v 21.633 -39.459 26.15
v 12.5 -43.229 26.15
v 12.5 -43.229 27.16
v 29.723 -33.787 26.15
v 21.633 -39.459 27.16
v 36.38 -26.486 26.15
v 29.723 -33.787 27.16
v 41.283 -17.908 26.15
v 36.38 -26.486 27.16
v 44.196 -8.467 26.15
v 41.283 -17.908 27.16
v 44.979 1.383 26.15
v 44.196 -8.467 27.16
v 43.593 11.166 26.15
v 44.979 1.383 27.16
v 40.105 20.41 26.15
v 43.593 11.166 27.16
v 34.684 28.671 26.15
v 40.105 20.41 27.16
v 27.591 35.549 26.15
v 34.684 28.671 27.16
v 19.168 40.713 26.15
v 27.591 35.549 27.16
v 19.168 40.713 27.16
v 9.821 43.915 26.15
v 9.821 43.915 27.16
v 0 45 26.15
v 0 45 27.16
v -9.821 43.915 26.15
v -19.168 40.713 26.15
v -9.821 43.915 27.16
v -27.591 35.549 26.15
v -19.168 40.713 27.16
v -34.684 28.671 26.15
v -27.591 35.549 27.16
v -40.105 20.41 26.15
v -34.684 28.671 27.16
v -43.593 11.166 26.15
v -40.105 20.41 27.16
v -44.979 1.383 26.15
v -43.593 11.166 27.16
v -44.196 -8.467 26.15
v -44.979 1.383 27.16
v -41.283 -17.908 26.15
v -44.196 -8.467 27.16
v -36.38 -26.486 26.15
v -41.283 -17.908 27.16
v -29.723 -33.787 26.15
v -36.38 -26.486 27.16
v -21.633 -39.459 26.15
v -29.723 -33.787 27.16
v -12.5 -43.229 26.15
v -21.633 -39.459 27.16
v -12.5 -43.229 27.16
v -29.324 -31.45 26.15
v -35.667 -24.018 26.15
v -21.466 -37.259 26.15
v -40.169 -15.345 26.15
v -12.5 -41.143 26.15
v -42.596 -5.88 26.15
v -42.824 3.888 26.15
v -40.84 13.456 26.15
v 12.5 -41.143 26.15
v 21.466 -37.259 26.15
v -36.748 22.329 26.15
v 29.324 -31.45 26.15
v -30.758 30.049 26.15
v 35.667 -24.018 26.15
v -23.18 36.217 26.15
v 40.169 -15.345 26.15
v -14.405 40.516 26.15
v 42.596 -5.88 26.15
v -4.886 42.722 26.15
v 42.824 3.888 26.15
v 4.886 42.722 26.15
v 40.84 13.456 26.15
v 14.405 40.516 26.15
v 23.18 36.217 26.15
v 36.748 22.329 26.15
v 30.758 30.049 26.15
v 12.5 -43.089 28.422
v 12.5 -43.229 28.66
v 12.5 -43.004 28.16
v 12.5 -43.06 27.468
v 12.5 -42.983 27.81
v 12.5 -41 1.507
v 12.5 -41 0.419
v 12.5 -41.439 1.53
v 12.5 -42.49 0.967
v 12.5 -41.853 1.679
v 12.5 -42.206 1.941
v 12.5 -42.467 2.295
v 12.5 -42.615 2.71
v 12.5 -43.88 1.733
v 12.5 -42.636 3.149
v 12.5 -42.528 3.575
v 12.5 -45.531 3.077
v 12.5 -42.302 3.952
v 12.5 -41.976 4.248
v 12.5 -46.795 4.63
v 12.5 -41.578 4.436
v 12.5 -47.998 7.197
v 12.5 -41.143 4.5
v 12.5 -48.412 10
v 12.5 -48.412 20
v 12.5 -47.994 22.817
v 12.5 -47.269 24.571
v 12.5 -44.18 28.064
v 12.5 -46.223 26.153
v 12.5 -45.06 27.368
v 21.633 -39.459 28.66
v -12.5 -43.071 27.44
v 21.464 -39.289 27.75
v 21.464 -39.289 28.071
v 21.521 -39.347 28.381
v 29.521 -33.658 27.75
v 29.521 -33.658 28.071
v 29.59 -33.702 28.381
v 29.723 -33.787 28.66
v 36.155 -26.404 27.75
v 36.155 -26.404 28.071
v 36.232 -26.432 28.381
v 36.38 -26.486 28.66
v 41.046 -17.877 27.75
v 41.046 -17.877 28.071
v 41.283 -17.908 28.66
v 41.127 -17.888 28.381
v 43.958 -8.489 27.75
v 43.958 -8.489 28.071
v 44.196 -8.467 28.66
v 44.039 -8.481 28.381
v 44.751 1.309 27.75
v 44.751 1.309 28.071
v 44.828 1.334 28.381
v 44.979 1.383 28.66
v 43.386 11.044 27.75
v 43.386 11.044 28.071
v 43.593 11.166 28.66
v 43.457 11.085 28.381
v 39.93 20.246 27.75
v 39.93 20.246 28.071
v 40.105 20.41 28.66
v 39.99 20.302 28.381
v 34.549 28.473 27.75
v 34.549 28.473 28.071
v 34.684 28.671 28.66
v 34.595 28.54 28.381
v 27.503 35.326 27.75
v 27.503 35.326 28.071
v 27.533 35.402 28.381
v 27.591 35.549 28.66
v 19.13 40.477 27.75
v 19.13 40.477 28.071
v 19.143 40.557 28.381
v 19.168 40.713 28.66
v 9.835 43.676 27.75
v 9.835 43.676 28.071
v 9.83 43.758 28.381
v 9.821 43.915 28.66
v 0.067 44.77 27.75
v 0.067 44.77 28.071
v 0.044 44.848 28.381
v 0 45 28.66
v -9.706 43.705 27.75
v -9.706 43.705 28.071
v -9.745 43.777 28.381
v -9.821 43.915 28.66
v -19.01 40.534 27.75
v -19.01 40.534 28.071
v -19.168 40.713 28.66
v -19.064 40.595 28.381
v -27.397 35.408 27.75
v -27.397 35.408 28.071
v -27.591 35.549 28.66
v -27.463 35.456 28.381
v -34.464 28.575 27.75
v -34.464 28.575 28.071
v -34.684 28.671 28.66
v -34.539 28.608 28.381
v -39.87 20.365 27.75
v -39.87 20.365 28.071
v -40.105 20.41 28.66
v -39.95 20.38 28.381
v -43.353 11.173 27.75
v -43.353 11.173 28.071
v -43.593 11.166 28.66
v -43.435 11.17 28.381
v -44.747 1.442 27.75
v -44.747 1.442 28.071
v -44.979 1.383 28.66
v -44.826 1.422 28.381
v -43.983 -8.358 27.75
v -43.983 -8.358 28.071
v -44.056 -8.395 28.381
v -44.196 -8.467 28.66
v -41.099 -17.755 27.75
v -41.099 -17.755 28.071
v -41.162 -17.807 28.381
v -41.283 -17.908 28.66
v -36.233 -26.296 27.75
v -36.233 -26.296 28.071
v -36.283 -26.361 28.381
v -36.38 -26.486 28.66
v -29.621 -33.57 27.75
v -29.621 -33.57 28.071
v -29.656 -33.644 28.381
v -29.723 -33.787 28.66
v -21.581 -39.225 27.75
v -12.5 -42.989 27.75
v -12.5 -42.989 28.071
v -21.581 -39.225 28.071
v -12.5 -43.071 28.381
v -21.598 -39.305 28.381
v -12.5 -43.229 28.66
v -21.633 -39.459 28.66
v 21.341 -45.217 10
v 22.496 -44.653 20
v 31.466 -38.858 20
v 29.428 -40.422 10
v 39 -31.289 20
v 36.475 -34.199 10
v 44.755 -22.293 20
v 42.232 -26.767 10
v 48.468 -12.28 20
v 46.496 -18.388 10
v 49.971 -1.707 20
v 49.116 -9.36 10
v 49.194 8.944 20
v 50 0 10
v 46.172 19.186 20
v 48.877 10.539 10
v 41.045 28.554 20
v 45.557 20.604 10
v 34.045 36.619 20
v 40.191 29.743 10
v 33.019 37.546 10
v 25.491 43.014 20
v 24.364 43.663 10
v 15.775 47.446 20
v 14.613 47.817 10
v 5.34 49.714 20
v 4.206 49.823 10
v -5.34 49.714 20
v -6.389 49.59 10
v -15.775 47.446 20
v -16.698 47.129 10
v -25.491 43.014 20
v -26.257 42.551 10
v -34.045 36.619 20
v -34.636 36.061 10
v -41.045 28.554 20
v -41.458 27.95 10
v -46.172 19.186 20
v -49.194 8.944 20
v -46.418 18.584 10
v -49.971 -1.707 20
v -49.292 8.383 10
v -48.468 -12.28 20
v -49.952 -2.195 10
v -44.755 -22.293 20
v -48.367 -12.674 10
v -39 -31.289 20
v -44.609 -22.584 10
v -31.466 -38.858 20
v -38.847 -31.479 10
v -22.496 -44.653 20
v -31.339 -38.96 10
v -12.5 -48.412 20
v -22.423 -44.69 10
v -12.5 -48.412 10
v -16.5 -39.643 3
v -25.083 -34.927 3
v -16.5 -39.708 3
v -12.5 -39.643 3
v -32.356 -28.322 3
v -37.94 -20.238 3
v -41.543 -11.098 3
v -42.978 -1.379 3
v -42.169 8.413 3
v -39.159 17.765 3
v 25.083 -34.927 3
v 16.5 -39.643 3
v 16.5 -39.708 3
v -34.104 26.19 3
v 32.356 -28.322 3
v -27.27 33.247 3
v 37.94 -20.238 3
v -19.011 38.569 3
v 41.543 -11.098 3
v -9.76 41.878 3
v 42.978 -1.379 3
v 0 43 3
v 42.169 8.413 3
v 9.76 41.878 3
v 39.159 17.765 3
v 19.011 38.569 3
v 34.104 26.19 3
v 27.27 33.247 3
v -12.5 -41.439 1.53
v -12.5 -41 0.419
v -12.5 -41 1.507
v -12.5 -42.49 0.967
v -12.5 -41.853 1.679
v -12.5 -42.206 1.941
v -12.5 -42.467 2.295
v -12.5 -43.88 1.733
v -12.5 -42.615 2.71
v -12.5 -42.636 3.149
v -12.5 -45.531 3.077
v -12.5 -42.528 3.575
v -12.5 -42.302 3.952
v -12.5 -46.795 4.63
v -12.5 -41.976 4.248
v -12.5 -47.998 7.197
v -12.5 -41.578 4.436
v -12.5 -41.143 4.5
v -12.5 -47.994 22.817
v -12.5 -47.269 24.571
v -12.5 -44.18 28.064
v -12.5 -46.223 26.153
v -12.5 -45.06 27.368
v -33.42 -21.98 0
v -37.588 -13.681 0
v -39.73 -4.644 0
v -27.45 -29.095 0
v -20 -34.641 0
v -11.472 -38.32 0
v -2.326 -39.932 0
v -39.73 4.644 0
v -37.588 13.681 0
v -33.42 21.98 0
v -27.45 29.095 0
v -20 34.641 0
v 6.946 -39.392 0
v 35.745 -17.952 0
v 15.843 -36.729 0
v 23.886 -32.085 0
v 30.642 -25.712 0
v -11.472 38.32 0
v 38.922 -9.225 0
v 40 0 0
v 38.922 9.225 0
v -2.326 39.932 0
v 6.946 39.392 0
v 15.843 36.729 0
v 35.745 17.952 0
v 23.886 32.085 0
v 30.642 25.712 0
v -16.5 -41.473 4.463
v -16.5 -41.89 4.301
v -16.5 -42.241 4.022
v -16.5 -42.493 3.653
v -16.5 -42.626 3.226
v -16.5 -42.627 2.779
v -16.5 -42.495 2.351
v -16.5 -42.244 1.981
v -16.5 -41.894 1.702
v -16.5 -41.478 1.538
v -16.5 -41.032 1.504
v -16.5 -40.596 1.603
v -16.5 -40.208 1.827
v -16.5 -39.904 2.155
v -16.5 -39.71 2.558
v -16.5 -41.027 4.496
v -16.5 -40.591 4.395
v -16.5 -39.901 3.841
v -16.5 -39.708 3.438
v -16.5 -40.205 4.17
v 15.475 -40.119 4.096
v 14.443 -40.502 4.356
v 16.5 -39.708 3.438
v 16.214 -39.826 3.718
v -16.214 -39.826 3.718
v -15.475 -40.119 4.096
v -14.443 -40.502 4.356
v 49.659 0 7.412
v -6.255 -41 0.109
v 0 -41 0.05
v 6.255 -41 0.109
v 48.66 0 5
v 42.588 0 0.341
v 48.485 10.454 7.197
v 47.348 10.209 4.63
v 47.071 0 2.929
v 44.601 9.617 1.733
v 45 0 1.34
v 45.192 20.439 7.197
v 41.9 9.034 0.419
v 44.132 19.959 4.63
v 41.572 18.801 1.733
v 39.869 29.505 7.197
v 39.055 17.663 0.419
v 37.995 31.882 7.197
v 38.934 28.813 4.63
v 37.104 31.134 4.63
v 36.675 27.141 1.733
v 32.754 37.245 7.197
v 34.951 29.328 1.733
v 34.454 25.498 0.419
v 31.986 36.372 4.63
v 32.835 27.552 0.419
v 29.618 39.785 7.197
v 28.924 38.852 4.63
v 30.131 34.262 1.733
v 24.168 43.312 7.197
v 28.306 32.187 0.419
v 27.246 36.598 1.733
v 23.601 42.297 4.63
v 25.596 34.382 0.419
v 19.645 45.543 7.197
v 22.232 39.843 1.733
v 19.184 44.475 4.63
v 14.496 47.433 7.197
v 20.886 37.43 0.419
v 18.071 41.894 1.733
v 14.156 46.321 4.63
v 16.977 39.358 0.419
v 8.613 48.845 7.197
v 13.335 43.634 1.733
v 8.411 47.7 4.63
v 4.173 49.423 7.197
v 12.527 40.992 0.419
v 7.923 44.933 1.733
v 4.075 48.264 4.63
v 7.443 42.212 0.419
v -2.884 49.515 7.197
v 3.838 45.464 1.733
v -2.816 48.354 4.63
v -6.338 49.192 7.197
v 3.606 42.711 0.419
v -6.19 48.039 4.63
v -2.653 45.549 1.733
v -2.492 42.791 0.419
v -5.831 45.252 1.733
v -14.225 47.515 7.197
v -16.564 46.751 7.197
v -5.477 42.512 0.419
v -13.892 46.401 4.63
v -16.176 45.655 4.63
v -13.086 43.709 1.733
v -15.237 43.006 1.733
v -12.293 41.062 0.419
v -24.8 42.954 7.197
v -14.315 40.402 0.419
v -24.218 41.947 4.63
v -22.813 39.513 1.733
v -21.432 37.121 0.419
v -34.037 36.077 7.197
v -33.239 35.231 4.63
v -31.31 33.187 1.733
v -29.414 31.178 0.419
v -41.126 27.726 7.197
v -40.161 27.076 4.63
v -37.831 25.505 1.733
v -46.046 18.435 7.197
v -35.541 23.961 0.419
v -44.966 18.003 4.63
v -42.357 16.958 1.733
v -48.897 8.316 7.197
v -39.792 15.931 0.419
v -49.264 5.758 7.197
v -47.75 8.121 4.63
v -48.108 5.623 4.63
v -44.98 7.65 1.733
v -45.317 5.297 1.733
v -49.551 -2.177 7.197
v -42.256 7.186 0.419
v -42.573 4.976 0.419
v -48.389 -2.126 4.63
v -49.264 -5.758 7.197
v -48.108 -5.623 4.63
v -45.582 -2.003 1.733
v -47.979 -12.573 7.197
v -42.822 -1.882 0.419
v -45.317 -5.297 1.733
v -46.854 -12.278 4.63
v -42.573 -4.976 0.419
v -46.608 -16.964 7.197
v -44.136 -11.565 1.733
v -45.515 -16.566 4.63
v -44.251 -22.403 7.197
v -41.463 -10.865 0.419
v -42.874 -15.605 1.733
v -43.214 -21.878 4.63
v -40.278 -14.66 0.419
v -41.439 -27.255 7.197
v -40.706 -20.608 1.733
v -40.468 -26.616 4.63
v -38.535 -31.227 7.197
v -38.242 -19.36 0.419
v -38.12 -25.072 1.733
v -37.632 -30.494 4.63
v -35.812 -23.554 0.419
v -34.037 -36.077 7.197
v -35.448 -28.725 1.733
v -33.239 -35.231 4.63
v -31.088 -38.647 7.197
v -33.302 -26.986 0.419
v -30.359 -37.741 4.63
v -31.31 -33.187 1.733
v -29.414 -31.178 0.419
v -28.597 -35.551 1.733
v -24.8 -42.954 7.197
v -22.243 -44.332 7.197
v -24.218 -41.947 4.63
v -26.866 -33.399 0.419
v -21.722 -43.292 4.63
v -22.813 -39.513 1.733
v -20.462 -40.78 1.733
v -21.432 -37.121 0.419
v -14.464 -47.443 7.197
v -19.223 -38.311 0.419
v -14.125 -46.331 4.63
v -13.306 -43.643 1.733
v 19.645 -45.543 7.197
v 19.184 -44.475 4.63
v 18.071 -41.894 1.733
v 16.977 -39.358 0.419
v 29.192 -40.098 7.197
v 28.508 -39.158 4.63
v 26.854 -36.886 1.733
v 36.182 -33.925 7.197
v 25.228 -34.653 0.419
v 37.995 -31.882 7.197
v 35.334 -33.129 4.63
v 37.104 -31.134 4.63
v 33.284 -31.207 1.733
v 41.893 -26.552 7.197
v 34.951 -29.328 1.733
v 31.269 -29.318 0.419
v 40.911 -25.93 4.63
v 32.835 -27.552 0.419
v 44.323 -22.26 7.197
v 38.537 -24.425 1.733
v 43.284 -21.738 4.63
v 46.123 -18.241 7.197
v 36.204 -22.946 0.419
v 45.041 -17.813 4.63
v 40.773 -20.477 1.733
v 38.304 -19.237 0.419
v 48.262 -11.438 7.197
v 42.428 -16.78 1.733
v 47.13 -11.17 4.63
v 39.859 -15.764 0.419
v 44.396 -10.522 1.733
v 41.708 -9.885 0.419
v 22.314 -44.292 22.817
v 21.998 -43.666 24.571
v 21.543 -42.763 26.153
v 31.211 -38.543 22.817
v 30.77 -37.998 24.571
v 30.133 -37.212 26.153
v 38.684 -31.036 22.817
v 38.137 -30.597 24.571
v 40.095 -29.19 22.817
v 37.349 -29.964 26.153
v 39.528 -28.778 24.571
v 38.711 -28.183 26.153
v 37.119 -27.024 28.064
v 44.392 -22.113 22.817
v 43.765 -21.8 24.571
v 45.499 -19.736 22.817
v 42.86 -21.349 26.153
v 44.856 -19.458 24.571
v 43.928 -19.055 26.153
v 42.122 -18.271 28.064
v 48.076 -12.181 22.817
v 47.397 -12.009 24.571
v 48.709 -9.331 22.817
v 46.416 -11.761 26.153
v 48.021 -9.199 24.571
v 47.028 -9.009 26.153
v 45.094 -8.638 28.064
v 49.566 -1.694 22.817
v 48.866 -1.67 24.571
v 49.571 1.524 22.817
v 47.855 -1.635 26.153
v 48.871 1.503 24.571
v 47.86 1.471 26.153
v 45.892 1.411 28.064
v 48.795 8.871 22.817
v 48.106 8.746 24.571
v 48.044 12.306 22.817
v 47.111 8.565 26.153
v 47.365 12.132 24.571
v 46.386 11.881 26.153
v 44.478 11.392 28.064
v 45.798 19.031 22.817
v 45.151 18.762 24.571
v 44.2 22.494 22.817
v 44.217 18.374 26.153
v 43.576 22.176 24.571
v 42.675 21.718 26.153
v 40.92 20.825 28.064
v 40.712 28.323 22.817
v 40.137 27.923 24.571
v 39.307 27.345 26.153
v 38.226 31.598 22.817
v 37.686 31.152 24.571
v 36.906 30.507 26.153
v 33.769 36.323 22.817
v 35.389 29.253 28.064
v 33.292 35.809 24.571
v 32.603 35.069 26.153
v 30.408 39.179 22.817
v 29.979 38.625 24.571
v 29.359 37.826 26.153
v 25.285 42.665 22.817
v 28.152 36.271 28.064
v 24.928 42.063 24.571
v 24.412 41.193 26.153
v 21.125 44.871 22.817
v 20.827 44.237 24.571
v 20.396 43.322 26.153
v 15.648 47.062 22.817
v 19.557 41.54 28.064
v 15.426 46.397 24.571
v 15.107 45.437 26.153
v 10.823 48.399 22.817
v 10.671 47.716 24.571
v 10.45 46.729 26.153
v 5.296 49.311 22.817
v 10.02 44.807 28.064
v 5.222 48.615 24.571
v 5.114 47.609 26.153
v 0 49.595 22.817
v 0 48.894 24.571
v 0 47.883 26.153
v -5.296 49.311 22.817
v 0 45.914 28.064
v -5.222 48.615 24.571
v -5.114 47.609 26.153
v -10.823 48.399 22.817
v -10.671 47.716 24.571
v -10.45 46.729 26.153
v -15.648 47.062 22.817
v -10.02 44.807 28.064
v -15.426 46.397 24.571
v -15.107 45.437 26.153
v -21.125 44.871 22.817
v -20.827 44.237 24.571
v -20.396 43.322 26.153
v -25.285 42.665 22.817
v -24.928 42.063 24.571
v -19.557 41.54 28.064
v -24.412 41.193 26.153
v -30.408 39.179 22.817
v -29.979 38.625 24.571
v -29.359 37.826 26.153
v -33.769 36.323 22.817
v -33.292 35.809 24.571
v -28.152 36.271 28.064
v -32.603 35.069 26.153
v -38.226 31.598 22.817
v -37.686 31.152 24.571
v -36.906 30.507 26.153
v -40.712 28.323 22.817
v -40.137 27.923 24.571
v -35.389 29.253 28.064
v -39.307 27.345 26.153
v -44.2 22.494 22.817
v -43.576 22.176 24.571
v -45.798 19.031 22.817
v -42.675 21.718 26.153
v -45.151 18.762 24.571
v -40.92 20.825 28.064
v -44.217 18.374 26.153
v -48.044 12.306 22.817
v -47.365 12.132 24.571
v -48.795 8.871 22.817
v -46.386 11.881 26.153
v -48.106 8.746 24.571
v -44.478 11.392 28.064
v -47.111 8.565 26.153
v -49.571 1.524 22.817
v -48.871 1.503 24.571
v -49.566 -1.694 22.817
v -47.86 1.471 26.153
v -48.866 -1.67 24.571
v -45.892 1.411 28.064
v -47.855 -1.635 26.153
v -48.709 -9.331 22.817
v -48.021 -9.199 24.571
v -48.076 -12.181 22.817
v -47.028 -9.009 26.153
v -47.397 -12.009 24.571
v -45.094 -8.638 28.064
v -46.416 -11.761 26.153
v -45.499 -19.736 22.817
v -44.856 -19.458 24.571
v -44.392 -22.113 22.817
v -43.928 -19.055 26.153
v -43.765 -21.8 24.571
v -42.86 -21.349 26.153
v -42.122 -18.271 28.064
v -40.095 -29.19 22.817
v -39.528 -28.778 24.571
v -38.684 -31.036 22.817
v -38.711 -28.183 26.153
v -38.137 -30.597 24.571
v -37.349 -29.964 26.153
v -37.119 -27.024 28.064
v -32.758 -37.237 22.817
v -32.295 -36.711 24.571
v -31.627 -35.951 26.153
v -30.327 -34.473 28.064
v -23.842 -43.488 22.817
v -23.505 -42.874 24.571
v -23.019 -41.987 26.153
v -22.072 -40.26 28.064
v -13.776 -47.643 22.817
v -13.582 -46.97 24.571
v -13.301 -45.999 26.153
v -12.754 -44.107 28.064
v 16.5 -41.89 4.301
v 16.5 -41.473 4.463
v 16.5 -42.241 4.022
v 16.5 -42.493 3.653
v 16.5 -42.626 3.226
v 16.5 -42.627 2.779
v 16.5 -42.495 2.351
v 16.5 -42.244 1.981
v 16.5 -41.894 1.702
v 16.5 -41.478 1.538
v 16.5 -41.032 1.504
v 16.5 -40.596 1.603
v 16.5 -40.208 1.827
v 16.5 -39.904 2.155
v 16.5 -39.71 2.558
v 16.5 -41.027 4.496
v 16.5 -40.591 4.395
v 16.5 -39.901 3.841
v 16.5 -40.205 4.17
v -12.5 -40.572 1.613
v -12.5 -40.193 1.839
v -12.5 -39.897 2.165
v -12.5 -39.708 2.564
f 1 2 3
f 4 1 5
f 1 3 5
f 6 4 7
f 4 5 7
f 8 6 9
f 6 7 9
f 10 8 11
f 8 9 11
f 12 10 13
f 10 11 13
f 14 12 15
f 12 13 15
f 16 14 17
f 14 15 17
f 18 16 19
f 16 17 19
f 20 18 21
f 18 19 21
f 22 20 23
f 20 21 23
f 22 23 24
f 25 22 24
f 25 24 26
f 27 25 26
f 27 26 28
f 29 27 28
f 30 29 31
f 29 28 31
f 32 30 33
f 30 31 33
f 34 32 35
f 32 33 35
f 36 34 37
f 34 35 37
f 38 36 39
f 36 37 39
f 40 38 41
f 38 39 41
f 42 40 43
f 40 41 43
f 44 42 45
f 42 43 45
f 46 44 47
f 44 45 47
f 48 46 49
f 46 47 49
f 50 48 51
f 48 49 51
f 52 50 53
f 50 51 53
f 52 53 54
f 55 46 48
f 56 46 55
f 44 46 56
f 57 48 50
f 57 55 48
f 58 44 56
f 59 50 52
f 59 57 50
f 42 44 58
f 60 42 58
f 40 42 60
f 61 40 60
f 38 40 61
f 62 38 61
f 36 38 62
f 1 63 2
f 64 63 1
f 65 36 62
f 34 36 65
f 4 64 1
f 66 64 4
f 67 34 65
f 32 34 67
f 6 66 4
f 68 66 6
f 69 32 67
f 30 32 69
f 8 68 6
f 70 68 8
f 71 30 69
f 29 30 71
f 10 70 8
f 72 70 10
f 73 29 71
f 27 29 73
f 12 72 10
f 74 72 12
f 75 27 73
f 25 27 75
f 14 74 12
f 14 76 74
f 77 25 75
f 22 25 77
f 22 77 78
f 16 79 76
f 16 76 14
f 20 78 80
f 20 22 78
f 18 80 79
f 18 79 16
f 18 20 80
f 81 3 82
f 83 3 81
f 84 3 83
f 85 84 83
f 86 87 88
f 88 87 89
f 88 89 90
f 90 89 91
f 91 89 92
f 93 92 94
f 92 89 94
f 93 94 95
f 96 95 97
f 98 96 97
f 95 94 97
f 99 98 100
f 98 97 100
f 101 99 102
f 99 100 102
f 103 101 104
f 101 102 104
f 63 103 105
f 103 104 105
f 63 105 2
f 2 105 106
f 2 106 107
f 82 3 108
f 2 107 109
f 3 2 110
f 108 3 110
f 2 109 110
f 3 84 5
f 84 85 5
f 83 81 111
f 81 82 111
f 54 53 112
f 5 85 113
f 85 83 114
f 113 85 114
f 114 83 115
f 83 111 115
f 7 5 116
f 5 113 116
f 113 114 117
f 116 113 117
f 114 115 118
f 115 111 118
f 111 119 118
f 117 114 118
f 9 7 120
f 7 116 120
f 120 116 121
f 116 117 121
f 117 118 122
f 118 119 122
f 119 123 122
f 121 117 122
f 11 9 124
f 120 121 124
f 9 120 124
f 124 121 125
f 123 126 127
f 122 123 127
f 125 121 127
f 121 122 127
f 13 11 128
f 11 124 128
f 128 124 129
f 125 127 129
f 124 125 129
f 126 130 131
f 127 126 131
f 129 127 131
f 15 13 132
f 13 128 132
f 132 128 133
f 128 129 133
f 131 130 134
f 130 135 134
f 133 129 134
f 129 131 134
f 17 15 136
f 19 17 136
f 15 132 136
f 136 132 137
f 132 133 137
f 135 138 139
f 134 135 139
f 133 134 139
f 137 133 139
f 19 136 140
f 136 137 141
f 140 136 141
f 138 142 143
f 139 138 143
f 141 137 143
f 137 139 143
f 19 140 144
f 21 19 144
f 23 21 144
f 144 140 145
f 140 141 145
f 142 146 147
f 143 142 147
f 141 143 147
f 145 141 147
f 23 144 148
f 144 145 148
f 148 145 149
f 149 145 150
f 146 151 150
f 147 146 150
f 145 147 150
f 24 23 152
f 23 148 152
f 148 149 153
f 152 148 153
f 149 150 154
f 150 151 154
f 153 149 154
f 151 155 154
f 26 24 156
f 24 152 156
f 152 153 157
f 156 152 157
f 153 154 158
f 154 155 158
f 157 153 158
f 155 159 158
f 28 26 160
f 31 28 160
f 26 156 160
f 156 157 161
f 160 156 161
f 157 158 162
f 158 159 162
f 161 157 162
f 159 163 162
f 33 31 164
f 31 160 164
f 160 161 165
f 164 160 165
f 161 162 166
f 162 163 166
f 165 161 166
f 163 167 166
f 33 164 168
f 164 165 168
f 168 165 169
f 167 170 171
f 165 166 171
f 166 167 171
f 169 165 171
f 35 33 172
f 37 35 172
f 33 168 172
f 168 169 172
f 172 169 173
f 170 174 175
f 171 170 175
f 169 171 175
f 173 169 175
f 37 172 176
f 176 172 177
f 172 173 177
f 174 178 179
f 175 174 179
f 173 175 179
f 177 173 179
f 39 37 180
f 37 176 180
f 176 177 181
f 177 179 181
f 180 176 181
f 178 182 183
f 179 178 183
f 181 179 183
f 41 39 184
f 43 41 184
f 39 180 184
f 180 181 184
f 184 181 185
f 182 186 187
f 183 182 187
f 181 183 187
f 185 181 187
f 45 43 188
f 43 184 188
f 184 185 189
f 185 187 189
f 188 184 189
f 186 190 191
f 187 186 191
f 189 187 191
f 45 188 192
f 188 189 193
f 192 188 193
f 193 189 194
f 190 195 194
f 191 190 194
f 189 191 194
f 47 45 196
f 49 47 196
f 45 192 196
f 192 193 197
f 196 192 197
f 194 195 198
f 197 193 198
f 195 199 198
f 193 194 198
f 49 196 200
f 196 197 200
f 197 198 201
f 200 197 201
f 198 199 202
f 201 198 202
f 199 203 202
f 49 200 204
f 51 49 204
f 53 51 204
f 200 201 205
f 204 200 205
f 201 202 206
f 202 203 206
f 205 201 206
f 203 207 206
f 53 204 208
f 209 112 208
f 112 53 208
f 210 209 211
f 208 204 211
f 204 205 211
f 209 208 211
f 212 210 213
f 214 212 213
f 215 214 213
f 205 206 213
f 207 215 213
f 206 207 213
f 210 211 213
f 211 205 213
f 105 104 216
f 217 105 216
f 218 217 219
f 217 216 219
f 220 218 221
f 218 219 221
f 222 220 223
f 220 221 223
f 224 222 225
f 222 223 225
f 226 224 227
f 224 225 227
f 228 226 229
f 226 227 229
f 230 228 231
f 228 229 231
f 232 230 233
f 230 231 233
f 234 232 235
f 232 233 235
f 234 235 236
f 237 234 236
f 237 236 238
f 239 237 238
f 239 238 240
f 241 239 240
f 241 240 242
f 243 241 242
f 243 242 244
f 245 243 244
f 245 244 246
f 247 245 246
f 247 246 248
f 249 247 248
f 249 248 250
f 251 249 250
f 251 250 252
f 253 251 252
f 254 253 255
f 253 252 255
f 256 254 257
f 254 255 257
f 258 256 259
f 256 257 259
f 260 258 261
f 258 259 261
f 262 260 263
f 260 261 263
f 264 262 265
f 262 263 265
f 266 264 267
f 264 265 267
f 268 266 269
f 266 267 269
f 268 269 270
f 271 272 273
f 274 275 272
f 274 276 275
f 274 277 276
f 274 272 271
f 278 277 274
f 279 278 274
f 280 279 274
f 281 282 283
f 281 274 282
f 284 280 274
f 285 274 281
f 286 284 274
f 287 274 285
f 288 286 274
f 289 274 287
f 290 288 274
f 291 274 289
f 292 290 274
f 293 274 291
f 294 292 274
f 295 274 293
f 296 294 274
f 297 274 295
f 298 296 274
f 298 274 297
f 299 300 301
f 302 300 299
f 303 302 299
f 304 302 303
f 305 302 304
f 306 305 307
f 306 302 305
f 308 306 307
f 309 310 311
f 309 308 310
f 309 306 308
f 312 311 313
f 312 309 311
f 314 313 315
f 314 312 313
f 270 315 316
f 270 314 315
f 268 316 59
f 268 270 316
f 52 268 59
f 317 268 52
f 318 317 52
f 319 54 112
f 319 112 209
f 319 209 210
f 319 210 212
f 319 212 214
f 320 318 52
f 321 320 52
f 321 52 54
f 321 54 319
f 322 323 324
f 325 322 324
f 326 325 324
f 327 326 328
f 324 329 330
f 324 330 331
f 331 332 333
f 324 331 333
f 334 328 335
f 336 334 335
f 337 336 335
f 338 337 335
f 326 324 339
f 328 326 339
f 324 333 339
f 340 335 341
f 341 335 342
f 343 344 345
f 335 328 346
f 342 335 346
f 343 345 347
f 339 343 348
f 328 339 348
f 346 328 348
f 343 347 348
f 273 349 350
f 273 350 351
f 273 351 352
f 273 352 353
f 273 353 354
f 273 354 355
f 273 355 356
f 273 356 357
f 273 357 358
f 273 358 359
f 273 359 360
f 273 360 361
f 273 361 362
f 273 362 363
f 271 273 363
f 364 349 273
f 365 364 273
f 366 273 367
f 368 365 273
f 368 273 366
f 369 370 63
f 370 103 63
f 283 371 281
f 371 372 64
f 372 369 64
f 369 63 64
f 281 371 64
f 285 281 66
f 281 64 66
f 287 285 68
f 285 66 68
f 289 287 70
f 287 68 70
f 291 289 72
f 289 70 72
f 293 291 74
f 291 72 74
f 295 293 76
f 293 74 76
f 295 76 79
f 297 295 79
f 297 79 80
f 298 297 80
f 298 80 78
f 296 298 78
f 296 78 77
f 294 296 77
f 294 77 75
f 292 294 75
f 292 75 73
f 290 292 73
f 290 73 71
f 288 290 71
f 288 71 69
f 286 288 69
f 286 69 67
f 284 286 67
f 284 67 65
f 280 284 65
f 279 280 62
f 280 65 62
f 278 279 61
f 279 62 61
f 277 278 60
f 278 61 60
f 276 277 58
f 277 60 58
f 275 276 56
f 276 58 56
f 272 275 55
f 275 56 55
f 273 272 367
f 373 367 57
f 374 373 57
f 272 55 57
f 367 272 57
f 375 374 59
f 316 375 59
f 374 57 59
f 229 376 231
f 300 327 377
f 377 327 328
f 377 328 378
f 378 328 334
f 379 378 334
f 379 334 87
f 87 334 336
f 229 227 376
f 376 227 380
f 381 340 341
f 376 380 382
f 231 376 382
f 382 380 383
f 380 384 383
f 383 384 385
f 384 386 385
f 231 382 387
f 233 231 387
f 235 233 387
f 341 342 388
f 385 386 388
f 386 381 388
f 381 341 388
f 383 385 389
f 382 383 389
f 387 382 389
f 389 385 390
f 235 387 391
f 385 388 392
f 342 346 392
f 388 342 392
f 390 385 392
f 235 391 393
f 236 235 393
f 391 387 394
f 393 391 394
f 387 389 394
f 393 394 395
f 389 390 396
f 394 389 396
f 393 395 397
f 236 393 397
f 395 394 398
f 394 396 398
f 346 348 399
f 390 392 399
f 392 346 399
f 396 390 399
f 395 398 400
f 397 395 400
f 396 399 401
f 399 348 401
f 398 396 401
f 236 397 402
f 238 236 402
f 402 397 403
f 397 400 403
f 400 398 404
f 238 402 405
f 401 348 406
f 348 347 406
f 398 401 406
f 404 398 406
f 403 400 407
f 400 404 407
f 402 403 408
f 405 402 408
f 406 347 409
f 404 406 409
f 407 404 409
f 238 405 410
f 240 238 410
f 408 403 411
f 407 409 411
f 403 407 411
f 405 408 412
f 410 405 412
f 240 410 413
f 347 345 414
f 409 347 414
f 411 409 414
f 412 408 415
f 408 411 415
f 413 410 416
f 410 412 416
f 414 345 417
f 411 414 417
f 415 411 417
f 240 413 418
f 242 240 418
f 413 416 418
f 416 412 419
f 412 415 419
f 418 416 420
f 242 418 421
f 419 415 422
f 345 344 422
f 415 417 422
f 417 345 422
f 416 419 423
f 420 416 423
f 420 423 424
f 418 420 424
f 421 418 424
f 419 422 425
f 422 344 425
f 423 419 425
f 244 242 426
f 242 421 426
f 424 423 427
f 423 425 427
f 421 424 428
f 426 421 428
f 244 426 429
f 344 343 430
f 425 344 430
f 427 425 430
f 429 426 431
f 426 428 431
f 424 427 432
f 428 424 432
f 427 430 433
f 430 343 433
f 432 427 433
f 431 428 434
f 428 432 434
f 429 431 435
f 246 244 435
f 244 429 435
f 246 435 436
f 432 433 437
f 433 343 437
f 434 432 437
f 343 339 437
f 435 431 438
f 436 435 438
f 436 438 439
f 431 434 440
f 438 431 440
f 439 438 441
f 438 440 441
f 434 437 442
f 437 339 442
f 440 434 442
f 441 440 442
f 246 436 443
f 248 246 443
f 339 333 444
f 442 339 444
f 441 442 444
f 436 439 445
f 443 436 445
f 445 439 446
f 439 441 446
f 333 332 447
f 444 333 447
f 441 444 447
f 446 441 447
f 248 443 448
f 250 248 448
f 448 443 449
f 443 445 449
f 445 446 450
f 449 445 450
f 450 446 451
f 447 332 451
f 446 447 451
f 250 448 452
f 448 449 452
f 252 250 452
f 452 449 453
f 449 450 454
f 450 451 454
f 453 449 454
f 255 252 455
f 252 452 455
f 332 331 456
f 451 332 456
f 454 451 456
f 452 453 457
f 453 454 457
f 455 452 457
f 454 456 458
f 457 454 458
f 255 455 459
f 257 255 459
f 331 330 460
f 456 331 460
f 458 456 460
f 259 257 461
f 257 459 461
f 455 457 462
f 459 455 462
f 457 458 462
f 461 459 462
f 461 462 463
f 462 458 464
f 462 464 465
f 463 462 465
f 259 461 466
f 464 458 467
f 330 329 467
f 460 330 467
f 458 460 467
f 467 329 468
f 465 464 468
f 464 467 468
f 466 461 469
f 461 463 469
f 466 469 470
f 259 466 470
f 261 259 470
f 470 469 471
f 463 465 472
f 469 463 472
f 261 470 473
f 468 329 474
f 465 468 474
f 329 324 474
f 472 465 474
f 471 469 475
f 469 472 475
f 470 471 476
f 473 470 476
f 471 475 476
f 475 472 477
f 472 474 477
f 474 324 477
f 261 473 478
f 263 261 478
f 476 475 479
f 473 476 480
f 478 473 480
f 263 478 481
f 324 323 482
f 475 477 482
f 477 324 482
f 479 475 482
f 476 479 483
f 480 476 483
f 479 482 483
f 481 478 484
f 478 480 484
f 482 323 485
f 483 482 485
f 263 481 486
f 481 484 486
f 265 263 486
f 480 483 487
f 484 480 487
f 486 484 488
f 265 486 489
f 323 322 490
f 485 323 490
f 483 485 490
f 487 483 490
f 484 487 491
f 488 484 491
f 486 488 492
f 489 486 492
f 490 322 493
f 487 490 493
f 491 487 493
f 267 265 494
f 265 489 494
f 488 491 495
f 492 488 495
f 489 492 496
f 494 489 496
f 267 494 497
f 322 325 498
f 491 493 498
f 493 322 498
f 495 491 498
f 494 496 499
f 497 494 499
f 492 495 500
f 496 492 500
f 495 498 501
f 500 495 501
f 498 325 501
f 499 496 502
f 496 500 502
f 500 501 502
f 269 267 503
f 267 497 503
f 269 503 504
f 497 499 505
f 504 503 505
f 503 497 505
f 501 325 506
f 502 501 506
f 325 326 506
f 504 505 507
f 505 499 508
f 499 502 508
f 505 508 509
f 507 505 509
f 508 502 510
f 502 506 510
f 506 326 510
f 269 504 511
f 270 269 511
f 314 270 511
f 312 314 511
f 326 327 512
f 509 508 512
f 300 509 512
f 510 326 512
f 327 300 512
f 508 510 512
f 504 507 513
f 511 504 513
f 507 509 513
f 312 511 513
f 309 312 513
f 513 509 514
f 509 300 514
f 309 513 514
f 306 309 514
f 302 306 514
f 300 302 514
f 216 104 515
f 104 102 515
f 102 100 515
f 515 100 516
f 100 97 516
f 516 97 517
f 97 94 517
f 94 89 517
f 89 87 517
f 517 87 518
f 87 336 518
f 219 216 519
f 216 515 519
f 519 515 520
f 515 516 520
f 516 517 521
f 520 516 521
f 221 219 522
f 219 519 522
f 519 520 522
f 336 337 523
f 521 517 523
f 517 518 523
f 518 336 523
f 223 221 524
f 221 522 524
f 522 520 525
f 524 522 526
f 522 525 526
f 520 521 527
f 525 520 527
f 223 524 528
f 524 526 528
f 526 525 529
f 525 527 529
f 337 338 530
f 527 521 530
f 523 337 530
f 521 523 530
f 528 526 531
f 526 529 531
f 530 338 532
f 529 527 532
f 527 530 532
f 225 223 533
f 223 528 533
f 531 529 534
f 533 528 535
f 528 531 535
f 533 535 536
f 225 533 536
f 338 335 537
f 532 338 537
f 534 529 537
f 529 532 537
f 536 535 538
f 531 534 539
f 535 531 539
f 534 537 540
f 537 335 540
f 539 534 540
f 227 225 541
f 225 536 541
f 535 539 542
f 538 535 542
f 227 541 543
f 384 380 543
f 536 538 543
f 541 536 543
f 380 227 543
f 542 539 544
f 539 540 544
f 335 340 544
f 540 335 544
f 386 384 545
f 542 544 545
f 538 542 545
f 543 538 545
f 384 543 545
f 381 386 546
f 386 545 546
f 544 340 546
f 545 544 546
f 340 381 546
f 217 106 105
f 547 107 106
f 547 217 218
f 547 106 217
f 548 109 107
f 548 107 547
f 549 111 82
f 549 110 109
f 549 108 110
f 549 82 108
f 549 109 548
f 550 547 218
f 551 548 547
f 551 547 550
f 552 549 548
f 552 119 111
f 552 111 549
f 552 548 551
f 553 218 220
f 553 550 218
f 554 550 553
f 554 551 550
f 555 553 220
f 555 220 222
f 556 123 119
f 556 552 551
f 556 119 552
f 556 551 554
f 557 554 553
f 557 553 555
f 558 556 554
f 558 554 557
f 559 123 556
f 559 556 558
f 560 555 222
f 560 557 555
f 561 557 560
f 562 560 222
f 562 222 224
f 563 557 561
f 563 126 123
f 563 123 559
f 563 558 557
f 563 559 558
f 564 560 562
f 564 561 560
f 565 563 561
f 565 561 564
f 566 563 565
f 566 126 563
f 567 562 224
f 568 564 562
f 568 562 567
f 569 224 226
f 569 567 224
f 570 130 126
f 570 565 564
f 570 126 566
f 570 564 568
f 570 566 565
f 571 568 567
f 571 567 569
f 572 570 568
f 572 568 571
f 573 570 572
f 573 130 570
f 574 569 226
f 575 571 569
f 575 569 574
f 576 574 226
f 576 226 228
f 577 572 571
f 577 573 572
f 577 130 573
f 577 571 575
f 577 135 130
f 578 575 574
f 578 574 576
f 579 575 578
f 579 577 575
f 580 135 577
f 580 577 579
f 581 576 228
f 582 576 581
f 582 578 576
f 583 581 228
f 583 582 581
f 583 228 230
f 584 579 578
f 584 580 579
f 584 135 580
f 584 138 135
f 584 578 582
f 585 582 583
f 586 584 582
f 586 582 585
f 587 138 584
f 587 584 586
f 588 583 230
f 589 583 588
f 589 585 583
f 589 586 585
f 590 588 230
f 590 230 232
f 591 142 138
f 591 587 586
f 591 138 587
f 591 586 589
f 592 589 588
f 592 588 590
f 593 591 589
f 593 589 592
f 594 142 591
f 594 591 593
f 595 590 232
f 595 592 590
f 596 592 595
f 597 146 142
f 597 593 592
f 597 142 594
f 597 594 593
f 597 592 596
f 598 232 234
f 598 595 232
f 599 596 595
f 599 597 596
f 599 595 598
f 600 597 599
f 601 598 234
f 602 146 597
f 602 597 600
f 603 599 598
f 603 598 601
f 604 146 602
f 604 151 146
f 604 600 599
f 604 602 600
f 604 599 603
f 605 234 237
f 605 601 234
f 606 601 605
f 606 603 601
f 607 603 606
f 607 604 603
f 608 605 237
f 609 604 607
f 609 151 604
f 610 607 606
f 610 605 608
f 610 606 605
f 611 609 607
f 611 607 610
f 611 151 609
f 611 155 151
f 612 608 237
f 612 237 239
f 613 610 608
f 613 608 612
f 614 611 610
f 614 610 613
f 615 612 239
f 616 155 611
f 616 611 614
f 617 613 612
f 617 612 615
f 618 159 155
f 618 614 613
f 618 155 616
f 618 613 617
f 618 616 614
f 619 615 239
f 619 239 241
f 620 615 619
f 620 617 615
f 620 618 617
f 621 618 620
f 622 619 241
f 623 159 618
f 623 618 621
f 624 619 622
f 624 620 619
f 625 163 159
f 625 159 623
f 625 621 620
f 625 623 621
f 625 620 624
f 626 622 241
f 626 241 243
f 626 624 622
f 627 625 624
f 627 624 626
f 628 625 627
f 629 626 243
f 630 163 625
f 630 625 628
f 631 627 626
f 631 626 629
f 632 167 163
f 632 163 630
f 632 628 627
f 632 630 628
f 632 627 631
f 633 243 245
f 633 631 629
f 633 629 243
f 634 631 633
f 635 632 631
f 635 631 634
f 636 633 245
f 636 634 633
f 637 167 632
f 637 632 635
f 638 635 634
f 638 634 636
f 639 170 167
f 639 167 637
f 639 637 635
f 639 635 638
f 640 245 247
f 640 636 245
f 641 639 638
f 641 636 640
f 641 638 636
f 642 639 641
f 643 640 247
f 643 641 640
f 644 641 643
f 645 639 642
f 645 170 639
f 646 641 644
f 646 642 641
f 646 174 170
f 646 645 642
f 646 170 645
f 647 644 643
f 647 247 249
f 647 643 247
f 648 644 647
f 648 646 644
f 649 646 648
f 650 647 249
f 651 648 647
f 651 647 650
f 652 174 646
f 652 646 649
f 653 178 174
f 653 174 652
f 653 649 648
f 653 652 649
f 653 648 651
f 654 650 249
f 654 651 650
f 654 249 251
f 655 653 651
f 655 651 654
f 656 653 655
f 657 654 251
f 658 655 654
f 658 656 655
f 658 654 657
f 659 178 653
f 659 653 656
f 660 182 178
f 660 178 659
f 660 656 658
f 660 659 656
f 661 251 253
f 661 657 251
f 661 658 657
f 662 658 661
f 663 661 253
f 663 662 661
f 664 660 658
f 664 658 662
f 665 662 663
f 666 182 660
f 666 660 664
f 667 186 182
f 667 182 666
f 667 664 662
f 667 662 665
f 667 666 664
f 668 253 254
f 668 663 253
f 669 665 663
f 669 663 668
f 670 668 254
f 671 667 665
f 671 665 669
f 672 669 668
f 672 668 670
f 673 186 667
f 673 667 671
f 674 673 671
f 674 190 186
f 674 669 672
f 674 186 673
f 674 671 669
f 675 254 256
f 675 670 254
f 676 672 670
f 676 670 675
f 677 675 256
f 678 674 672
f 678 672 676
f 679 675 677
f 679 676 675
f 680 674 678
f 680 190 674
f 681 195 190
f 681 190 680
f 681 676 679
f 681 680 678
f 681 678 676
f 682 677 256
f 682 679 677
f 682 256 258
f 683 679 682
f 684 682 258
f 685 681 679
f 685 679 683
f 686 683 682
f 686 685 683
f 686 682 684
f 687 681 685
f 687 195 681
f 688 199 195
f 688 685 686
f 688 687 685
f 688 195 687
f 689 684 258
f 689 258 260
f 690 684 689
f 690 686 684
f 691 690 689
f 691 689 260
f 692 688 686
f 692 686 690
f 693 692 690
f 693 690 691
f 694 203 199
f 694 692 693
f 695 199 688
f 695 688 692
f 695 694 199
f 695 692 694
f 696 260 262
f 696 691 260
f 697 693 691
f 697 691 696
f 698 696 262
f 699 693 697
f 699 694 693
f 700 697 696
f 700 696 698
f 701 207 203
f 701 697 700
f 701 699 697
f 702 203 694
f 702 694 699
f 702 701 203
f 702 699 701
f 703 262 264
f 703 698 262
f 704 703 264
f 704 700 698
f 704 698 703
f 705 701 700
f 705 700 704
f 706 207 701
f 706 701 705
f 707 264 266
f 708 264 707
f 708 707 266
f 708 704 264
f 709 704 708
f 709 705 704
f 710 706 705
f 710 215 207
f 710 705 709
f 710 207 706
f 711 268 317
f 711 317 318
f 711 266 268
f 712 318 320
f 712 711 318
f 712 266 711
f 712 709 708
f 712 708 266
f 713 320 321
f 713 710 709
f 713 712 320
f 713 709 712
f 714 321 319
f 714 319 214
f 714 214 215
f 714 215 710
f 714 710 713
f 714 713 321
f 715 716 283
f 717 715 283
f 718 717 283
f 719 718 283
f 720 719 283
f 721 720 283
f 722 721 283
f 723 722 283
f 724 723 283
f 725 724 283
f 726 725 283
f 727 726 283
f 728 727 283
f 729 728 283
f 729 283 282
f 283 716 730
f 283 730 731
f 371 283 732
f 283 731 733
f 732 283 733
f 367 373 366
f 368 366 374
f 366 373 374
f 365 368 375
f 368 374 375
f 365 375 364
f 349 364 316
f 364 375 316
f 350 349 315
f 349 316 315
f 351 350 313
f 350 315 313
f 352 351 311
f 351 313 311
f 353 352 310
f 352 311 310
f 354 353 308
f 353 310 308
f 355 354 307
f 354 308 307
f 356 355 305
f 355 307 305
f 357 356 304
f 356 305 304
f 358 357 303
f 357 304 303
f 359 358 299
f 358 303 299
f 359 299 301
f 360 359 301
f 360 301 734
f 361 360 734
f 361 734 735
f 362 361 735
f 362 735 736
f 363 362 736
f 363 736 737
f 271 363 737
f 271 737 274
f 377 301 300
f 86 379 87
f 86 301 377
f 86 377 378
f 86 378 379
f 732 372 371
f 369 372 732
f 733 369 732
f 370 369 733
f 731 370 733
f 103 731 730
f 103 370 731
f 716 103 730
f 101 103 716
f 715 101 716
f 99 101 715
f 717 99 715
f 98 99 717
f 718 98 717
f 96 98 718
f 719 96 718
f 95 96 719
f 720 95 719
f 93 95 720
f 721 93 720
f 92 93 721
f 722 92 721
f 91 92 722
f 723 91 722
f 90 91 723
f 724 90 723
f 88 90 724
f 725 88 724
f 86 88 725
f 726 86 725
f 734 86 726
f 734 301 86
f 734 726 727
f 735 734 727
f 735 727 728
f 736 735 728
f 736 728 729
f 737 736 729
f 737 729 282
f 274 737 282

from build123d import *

# Parameters (mm, degrees)
F0_R      = 50
F1_DEPTH  = 30
F2_R      = 10
F3_R      = 43
F4_DEPTH  = 27
F6_W      = 12.5
F6_H      = 30
F7_DEPTH  = 9
F9_R      = 45
F10_DEPTH = 3.85
F12_R     = 1.5
F13_DEPTH = 4
F14_DEPTH = 29
F18_DEPTH = 9


with BuildPart() as f1:
    # F0 (on Top) → F1 (new body)
    with BuildSketch(Plane.XY):
        Circle(F0_R)
    extrude(amount=F1_DEPTH)

    # F2
    f2_edges = [f1.edges().sort_by_distance(p)[0] for p in [
        (-50, 0, 30),
        (-50, 0, 0),
    ]]
    fillet(f2_edges, radius=F2_R)

    # F3 (on face) → F4 (cut)
    with BuildSketch(Plane.XY.offset(30)):
        Circle(F3_R)
    extrude(amount=-F4_DEPTH, mode=Mode.SUBTRACT)

    # F6 (on offset) → F7 (cut)
    with BuildSketch(Plane.XZ.offset(50)):
        with Locations((-6.25, 15)):
            Rectangle(F6_W, F6_H)
        with Locations((6.25, 15)):
            Rectangle(F6_W, F6_H)
    extrude(amount=-F7_DEPTH, mode=Mode.SUBTRACT)

    # F9 (on offset) → F10 (cut)
    with BuildSketch(Plane.XY.offset(30)):
        Circle(F9_R)
    extrude(amount=-F10_DEPTH, mode=Mode.SUBTRACT)

    # F12 (on offset) → F13 (cut)
    with BuildSketch(Plane.YZ.offset(-12.5)):
        with Locations((-41.1430431543, 3)):
            Circle(F12_R)
    extrude(amount=-F13_DEPTH, mode=Mode.SUBTRACT)

    # F12 (on offset) → F14 (cut)
    with BuildSketch(Plane.YZ.offset(-12.5)):
        with Locations((-41.1430431543, 3)):
            Circle(F12_R)
    extrude(amount=F14_DEPTH, mode=Mode.SUBTRACT)

    # F15 (on offset) → F17 (revolve)
    with BuildSketch(Plane.YZ.offset(-12.5)):
        with BuildLine():
            Line((-43.2290411645, 28.6602540378), (-43.2290411645, 27.1602540378))
            ThreePointArc((-43.2290411645, 27.1602540378), (-42.9790411645, 27.9102540378), (-43.2290411645, 28.6602540378))
        make_face()
    revolve(axis=Axis((0, 0, 24.574), (0, 0, 1)))

    # F6 (on offset) → F18 (cut)
    with BuildSketch(Plane.XZ.offset(50)):
        with Locations((-6.25, 15)):
            Rectangle(F6_W, F6_H)
        with Locations((6.25, 15)):
            Rectangle(F6_W, F6_H)
    extrude(amount=-F18_DEPTH, mode=Mode.SUBTRACT)


solid = f1.part
